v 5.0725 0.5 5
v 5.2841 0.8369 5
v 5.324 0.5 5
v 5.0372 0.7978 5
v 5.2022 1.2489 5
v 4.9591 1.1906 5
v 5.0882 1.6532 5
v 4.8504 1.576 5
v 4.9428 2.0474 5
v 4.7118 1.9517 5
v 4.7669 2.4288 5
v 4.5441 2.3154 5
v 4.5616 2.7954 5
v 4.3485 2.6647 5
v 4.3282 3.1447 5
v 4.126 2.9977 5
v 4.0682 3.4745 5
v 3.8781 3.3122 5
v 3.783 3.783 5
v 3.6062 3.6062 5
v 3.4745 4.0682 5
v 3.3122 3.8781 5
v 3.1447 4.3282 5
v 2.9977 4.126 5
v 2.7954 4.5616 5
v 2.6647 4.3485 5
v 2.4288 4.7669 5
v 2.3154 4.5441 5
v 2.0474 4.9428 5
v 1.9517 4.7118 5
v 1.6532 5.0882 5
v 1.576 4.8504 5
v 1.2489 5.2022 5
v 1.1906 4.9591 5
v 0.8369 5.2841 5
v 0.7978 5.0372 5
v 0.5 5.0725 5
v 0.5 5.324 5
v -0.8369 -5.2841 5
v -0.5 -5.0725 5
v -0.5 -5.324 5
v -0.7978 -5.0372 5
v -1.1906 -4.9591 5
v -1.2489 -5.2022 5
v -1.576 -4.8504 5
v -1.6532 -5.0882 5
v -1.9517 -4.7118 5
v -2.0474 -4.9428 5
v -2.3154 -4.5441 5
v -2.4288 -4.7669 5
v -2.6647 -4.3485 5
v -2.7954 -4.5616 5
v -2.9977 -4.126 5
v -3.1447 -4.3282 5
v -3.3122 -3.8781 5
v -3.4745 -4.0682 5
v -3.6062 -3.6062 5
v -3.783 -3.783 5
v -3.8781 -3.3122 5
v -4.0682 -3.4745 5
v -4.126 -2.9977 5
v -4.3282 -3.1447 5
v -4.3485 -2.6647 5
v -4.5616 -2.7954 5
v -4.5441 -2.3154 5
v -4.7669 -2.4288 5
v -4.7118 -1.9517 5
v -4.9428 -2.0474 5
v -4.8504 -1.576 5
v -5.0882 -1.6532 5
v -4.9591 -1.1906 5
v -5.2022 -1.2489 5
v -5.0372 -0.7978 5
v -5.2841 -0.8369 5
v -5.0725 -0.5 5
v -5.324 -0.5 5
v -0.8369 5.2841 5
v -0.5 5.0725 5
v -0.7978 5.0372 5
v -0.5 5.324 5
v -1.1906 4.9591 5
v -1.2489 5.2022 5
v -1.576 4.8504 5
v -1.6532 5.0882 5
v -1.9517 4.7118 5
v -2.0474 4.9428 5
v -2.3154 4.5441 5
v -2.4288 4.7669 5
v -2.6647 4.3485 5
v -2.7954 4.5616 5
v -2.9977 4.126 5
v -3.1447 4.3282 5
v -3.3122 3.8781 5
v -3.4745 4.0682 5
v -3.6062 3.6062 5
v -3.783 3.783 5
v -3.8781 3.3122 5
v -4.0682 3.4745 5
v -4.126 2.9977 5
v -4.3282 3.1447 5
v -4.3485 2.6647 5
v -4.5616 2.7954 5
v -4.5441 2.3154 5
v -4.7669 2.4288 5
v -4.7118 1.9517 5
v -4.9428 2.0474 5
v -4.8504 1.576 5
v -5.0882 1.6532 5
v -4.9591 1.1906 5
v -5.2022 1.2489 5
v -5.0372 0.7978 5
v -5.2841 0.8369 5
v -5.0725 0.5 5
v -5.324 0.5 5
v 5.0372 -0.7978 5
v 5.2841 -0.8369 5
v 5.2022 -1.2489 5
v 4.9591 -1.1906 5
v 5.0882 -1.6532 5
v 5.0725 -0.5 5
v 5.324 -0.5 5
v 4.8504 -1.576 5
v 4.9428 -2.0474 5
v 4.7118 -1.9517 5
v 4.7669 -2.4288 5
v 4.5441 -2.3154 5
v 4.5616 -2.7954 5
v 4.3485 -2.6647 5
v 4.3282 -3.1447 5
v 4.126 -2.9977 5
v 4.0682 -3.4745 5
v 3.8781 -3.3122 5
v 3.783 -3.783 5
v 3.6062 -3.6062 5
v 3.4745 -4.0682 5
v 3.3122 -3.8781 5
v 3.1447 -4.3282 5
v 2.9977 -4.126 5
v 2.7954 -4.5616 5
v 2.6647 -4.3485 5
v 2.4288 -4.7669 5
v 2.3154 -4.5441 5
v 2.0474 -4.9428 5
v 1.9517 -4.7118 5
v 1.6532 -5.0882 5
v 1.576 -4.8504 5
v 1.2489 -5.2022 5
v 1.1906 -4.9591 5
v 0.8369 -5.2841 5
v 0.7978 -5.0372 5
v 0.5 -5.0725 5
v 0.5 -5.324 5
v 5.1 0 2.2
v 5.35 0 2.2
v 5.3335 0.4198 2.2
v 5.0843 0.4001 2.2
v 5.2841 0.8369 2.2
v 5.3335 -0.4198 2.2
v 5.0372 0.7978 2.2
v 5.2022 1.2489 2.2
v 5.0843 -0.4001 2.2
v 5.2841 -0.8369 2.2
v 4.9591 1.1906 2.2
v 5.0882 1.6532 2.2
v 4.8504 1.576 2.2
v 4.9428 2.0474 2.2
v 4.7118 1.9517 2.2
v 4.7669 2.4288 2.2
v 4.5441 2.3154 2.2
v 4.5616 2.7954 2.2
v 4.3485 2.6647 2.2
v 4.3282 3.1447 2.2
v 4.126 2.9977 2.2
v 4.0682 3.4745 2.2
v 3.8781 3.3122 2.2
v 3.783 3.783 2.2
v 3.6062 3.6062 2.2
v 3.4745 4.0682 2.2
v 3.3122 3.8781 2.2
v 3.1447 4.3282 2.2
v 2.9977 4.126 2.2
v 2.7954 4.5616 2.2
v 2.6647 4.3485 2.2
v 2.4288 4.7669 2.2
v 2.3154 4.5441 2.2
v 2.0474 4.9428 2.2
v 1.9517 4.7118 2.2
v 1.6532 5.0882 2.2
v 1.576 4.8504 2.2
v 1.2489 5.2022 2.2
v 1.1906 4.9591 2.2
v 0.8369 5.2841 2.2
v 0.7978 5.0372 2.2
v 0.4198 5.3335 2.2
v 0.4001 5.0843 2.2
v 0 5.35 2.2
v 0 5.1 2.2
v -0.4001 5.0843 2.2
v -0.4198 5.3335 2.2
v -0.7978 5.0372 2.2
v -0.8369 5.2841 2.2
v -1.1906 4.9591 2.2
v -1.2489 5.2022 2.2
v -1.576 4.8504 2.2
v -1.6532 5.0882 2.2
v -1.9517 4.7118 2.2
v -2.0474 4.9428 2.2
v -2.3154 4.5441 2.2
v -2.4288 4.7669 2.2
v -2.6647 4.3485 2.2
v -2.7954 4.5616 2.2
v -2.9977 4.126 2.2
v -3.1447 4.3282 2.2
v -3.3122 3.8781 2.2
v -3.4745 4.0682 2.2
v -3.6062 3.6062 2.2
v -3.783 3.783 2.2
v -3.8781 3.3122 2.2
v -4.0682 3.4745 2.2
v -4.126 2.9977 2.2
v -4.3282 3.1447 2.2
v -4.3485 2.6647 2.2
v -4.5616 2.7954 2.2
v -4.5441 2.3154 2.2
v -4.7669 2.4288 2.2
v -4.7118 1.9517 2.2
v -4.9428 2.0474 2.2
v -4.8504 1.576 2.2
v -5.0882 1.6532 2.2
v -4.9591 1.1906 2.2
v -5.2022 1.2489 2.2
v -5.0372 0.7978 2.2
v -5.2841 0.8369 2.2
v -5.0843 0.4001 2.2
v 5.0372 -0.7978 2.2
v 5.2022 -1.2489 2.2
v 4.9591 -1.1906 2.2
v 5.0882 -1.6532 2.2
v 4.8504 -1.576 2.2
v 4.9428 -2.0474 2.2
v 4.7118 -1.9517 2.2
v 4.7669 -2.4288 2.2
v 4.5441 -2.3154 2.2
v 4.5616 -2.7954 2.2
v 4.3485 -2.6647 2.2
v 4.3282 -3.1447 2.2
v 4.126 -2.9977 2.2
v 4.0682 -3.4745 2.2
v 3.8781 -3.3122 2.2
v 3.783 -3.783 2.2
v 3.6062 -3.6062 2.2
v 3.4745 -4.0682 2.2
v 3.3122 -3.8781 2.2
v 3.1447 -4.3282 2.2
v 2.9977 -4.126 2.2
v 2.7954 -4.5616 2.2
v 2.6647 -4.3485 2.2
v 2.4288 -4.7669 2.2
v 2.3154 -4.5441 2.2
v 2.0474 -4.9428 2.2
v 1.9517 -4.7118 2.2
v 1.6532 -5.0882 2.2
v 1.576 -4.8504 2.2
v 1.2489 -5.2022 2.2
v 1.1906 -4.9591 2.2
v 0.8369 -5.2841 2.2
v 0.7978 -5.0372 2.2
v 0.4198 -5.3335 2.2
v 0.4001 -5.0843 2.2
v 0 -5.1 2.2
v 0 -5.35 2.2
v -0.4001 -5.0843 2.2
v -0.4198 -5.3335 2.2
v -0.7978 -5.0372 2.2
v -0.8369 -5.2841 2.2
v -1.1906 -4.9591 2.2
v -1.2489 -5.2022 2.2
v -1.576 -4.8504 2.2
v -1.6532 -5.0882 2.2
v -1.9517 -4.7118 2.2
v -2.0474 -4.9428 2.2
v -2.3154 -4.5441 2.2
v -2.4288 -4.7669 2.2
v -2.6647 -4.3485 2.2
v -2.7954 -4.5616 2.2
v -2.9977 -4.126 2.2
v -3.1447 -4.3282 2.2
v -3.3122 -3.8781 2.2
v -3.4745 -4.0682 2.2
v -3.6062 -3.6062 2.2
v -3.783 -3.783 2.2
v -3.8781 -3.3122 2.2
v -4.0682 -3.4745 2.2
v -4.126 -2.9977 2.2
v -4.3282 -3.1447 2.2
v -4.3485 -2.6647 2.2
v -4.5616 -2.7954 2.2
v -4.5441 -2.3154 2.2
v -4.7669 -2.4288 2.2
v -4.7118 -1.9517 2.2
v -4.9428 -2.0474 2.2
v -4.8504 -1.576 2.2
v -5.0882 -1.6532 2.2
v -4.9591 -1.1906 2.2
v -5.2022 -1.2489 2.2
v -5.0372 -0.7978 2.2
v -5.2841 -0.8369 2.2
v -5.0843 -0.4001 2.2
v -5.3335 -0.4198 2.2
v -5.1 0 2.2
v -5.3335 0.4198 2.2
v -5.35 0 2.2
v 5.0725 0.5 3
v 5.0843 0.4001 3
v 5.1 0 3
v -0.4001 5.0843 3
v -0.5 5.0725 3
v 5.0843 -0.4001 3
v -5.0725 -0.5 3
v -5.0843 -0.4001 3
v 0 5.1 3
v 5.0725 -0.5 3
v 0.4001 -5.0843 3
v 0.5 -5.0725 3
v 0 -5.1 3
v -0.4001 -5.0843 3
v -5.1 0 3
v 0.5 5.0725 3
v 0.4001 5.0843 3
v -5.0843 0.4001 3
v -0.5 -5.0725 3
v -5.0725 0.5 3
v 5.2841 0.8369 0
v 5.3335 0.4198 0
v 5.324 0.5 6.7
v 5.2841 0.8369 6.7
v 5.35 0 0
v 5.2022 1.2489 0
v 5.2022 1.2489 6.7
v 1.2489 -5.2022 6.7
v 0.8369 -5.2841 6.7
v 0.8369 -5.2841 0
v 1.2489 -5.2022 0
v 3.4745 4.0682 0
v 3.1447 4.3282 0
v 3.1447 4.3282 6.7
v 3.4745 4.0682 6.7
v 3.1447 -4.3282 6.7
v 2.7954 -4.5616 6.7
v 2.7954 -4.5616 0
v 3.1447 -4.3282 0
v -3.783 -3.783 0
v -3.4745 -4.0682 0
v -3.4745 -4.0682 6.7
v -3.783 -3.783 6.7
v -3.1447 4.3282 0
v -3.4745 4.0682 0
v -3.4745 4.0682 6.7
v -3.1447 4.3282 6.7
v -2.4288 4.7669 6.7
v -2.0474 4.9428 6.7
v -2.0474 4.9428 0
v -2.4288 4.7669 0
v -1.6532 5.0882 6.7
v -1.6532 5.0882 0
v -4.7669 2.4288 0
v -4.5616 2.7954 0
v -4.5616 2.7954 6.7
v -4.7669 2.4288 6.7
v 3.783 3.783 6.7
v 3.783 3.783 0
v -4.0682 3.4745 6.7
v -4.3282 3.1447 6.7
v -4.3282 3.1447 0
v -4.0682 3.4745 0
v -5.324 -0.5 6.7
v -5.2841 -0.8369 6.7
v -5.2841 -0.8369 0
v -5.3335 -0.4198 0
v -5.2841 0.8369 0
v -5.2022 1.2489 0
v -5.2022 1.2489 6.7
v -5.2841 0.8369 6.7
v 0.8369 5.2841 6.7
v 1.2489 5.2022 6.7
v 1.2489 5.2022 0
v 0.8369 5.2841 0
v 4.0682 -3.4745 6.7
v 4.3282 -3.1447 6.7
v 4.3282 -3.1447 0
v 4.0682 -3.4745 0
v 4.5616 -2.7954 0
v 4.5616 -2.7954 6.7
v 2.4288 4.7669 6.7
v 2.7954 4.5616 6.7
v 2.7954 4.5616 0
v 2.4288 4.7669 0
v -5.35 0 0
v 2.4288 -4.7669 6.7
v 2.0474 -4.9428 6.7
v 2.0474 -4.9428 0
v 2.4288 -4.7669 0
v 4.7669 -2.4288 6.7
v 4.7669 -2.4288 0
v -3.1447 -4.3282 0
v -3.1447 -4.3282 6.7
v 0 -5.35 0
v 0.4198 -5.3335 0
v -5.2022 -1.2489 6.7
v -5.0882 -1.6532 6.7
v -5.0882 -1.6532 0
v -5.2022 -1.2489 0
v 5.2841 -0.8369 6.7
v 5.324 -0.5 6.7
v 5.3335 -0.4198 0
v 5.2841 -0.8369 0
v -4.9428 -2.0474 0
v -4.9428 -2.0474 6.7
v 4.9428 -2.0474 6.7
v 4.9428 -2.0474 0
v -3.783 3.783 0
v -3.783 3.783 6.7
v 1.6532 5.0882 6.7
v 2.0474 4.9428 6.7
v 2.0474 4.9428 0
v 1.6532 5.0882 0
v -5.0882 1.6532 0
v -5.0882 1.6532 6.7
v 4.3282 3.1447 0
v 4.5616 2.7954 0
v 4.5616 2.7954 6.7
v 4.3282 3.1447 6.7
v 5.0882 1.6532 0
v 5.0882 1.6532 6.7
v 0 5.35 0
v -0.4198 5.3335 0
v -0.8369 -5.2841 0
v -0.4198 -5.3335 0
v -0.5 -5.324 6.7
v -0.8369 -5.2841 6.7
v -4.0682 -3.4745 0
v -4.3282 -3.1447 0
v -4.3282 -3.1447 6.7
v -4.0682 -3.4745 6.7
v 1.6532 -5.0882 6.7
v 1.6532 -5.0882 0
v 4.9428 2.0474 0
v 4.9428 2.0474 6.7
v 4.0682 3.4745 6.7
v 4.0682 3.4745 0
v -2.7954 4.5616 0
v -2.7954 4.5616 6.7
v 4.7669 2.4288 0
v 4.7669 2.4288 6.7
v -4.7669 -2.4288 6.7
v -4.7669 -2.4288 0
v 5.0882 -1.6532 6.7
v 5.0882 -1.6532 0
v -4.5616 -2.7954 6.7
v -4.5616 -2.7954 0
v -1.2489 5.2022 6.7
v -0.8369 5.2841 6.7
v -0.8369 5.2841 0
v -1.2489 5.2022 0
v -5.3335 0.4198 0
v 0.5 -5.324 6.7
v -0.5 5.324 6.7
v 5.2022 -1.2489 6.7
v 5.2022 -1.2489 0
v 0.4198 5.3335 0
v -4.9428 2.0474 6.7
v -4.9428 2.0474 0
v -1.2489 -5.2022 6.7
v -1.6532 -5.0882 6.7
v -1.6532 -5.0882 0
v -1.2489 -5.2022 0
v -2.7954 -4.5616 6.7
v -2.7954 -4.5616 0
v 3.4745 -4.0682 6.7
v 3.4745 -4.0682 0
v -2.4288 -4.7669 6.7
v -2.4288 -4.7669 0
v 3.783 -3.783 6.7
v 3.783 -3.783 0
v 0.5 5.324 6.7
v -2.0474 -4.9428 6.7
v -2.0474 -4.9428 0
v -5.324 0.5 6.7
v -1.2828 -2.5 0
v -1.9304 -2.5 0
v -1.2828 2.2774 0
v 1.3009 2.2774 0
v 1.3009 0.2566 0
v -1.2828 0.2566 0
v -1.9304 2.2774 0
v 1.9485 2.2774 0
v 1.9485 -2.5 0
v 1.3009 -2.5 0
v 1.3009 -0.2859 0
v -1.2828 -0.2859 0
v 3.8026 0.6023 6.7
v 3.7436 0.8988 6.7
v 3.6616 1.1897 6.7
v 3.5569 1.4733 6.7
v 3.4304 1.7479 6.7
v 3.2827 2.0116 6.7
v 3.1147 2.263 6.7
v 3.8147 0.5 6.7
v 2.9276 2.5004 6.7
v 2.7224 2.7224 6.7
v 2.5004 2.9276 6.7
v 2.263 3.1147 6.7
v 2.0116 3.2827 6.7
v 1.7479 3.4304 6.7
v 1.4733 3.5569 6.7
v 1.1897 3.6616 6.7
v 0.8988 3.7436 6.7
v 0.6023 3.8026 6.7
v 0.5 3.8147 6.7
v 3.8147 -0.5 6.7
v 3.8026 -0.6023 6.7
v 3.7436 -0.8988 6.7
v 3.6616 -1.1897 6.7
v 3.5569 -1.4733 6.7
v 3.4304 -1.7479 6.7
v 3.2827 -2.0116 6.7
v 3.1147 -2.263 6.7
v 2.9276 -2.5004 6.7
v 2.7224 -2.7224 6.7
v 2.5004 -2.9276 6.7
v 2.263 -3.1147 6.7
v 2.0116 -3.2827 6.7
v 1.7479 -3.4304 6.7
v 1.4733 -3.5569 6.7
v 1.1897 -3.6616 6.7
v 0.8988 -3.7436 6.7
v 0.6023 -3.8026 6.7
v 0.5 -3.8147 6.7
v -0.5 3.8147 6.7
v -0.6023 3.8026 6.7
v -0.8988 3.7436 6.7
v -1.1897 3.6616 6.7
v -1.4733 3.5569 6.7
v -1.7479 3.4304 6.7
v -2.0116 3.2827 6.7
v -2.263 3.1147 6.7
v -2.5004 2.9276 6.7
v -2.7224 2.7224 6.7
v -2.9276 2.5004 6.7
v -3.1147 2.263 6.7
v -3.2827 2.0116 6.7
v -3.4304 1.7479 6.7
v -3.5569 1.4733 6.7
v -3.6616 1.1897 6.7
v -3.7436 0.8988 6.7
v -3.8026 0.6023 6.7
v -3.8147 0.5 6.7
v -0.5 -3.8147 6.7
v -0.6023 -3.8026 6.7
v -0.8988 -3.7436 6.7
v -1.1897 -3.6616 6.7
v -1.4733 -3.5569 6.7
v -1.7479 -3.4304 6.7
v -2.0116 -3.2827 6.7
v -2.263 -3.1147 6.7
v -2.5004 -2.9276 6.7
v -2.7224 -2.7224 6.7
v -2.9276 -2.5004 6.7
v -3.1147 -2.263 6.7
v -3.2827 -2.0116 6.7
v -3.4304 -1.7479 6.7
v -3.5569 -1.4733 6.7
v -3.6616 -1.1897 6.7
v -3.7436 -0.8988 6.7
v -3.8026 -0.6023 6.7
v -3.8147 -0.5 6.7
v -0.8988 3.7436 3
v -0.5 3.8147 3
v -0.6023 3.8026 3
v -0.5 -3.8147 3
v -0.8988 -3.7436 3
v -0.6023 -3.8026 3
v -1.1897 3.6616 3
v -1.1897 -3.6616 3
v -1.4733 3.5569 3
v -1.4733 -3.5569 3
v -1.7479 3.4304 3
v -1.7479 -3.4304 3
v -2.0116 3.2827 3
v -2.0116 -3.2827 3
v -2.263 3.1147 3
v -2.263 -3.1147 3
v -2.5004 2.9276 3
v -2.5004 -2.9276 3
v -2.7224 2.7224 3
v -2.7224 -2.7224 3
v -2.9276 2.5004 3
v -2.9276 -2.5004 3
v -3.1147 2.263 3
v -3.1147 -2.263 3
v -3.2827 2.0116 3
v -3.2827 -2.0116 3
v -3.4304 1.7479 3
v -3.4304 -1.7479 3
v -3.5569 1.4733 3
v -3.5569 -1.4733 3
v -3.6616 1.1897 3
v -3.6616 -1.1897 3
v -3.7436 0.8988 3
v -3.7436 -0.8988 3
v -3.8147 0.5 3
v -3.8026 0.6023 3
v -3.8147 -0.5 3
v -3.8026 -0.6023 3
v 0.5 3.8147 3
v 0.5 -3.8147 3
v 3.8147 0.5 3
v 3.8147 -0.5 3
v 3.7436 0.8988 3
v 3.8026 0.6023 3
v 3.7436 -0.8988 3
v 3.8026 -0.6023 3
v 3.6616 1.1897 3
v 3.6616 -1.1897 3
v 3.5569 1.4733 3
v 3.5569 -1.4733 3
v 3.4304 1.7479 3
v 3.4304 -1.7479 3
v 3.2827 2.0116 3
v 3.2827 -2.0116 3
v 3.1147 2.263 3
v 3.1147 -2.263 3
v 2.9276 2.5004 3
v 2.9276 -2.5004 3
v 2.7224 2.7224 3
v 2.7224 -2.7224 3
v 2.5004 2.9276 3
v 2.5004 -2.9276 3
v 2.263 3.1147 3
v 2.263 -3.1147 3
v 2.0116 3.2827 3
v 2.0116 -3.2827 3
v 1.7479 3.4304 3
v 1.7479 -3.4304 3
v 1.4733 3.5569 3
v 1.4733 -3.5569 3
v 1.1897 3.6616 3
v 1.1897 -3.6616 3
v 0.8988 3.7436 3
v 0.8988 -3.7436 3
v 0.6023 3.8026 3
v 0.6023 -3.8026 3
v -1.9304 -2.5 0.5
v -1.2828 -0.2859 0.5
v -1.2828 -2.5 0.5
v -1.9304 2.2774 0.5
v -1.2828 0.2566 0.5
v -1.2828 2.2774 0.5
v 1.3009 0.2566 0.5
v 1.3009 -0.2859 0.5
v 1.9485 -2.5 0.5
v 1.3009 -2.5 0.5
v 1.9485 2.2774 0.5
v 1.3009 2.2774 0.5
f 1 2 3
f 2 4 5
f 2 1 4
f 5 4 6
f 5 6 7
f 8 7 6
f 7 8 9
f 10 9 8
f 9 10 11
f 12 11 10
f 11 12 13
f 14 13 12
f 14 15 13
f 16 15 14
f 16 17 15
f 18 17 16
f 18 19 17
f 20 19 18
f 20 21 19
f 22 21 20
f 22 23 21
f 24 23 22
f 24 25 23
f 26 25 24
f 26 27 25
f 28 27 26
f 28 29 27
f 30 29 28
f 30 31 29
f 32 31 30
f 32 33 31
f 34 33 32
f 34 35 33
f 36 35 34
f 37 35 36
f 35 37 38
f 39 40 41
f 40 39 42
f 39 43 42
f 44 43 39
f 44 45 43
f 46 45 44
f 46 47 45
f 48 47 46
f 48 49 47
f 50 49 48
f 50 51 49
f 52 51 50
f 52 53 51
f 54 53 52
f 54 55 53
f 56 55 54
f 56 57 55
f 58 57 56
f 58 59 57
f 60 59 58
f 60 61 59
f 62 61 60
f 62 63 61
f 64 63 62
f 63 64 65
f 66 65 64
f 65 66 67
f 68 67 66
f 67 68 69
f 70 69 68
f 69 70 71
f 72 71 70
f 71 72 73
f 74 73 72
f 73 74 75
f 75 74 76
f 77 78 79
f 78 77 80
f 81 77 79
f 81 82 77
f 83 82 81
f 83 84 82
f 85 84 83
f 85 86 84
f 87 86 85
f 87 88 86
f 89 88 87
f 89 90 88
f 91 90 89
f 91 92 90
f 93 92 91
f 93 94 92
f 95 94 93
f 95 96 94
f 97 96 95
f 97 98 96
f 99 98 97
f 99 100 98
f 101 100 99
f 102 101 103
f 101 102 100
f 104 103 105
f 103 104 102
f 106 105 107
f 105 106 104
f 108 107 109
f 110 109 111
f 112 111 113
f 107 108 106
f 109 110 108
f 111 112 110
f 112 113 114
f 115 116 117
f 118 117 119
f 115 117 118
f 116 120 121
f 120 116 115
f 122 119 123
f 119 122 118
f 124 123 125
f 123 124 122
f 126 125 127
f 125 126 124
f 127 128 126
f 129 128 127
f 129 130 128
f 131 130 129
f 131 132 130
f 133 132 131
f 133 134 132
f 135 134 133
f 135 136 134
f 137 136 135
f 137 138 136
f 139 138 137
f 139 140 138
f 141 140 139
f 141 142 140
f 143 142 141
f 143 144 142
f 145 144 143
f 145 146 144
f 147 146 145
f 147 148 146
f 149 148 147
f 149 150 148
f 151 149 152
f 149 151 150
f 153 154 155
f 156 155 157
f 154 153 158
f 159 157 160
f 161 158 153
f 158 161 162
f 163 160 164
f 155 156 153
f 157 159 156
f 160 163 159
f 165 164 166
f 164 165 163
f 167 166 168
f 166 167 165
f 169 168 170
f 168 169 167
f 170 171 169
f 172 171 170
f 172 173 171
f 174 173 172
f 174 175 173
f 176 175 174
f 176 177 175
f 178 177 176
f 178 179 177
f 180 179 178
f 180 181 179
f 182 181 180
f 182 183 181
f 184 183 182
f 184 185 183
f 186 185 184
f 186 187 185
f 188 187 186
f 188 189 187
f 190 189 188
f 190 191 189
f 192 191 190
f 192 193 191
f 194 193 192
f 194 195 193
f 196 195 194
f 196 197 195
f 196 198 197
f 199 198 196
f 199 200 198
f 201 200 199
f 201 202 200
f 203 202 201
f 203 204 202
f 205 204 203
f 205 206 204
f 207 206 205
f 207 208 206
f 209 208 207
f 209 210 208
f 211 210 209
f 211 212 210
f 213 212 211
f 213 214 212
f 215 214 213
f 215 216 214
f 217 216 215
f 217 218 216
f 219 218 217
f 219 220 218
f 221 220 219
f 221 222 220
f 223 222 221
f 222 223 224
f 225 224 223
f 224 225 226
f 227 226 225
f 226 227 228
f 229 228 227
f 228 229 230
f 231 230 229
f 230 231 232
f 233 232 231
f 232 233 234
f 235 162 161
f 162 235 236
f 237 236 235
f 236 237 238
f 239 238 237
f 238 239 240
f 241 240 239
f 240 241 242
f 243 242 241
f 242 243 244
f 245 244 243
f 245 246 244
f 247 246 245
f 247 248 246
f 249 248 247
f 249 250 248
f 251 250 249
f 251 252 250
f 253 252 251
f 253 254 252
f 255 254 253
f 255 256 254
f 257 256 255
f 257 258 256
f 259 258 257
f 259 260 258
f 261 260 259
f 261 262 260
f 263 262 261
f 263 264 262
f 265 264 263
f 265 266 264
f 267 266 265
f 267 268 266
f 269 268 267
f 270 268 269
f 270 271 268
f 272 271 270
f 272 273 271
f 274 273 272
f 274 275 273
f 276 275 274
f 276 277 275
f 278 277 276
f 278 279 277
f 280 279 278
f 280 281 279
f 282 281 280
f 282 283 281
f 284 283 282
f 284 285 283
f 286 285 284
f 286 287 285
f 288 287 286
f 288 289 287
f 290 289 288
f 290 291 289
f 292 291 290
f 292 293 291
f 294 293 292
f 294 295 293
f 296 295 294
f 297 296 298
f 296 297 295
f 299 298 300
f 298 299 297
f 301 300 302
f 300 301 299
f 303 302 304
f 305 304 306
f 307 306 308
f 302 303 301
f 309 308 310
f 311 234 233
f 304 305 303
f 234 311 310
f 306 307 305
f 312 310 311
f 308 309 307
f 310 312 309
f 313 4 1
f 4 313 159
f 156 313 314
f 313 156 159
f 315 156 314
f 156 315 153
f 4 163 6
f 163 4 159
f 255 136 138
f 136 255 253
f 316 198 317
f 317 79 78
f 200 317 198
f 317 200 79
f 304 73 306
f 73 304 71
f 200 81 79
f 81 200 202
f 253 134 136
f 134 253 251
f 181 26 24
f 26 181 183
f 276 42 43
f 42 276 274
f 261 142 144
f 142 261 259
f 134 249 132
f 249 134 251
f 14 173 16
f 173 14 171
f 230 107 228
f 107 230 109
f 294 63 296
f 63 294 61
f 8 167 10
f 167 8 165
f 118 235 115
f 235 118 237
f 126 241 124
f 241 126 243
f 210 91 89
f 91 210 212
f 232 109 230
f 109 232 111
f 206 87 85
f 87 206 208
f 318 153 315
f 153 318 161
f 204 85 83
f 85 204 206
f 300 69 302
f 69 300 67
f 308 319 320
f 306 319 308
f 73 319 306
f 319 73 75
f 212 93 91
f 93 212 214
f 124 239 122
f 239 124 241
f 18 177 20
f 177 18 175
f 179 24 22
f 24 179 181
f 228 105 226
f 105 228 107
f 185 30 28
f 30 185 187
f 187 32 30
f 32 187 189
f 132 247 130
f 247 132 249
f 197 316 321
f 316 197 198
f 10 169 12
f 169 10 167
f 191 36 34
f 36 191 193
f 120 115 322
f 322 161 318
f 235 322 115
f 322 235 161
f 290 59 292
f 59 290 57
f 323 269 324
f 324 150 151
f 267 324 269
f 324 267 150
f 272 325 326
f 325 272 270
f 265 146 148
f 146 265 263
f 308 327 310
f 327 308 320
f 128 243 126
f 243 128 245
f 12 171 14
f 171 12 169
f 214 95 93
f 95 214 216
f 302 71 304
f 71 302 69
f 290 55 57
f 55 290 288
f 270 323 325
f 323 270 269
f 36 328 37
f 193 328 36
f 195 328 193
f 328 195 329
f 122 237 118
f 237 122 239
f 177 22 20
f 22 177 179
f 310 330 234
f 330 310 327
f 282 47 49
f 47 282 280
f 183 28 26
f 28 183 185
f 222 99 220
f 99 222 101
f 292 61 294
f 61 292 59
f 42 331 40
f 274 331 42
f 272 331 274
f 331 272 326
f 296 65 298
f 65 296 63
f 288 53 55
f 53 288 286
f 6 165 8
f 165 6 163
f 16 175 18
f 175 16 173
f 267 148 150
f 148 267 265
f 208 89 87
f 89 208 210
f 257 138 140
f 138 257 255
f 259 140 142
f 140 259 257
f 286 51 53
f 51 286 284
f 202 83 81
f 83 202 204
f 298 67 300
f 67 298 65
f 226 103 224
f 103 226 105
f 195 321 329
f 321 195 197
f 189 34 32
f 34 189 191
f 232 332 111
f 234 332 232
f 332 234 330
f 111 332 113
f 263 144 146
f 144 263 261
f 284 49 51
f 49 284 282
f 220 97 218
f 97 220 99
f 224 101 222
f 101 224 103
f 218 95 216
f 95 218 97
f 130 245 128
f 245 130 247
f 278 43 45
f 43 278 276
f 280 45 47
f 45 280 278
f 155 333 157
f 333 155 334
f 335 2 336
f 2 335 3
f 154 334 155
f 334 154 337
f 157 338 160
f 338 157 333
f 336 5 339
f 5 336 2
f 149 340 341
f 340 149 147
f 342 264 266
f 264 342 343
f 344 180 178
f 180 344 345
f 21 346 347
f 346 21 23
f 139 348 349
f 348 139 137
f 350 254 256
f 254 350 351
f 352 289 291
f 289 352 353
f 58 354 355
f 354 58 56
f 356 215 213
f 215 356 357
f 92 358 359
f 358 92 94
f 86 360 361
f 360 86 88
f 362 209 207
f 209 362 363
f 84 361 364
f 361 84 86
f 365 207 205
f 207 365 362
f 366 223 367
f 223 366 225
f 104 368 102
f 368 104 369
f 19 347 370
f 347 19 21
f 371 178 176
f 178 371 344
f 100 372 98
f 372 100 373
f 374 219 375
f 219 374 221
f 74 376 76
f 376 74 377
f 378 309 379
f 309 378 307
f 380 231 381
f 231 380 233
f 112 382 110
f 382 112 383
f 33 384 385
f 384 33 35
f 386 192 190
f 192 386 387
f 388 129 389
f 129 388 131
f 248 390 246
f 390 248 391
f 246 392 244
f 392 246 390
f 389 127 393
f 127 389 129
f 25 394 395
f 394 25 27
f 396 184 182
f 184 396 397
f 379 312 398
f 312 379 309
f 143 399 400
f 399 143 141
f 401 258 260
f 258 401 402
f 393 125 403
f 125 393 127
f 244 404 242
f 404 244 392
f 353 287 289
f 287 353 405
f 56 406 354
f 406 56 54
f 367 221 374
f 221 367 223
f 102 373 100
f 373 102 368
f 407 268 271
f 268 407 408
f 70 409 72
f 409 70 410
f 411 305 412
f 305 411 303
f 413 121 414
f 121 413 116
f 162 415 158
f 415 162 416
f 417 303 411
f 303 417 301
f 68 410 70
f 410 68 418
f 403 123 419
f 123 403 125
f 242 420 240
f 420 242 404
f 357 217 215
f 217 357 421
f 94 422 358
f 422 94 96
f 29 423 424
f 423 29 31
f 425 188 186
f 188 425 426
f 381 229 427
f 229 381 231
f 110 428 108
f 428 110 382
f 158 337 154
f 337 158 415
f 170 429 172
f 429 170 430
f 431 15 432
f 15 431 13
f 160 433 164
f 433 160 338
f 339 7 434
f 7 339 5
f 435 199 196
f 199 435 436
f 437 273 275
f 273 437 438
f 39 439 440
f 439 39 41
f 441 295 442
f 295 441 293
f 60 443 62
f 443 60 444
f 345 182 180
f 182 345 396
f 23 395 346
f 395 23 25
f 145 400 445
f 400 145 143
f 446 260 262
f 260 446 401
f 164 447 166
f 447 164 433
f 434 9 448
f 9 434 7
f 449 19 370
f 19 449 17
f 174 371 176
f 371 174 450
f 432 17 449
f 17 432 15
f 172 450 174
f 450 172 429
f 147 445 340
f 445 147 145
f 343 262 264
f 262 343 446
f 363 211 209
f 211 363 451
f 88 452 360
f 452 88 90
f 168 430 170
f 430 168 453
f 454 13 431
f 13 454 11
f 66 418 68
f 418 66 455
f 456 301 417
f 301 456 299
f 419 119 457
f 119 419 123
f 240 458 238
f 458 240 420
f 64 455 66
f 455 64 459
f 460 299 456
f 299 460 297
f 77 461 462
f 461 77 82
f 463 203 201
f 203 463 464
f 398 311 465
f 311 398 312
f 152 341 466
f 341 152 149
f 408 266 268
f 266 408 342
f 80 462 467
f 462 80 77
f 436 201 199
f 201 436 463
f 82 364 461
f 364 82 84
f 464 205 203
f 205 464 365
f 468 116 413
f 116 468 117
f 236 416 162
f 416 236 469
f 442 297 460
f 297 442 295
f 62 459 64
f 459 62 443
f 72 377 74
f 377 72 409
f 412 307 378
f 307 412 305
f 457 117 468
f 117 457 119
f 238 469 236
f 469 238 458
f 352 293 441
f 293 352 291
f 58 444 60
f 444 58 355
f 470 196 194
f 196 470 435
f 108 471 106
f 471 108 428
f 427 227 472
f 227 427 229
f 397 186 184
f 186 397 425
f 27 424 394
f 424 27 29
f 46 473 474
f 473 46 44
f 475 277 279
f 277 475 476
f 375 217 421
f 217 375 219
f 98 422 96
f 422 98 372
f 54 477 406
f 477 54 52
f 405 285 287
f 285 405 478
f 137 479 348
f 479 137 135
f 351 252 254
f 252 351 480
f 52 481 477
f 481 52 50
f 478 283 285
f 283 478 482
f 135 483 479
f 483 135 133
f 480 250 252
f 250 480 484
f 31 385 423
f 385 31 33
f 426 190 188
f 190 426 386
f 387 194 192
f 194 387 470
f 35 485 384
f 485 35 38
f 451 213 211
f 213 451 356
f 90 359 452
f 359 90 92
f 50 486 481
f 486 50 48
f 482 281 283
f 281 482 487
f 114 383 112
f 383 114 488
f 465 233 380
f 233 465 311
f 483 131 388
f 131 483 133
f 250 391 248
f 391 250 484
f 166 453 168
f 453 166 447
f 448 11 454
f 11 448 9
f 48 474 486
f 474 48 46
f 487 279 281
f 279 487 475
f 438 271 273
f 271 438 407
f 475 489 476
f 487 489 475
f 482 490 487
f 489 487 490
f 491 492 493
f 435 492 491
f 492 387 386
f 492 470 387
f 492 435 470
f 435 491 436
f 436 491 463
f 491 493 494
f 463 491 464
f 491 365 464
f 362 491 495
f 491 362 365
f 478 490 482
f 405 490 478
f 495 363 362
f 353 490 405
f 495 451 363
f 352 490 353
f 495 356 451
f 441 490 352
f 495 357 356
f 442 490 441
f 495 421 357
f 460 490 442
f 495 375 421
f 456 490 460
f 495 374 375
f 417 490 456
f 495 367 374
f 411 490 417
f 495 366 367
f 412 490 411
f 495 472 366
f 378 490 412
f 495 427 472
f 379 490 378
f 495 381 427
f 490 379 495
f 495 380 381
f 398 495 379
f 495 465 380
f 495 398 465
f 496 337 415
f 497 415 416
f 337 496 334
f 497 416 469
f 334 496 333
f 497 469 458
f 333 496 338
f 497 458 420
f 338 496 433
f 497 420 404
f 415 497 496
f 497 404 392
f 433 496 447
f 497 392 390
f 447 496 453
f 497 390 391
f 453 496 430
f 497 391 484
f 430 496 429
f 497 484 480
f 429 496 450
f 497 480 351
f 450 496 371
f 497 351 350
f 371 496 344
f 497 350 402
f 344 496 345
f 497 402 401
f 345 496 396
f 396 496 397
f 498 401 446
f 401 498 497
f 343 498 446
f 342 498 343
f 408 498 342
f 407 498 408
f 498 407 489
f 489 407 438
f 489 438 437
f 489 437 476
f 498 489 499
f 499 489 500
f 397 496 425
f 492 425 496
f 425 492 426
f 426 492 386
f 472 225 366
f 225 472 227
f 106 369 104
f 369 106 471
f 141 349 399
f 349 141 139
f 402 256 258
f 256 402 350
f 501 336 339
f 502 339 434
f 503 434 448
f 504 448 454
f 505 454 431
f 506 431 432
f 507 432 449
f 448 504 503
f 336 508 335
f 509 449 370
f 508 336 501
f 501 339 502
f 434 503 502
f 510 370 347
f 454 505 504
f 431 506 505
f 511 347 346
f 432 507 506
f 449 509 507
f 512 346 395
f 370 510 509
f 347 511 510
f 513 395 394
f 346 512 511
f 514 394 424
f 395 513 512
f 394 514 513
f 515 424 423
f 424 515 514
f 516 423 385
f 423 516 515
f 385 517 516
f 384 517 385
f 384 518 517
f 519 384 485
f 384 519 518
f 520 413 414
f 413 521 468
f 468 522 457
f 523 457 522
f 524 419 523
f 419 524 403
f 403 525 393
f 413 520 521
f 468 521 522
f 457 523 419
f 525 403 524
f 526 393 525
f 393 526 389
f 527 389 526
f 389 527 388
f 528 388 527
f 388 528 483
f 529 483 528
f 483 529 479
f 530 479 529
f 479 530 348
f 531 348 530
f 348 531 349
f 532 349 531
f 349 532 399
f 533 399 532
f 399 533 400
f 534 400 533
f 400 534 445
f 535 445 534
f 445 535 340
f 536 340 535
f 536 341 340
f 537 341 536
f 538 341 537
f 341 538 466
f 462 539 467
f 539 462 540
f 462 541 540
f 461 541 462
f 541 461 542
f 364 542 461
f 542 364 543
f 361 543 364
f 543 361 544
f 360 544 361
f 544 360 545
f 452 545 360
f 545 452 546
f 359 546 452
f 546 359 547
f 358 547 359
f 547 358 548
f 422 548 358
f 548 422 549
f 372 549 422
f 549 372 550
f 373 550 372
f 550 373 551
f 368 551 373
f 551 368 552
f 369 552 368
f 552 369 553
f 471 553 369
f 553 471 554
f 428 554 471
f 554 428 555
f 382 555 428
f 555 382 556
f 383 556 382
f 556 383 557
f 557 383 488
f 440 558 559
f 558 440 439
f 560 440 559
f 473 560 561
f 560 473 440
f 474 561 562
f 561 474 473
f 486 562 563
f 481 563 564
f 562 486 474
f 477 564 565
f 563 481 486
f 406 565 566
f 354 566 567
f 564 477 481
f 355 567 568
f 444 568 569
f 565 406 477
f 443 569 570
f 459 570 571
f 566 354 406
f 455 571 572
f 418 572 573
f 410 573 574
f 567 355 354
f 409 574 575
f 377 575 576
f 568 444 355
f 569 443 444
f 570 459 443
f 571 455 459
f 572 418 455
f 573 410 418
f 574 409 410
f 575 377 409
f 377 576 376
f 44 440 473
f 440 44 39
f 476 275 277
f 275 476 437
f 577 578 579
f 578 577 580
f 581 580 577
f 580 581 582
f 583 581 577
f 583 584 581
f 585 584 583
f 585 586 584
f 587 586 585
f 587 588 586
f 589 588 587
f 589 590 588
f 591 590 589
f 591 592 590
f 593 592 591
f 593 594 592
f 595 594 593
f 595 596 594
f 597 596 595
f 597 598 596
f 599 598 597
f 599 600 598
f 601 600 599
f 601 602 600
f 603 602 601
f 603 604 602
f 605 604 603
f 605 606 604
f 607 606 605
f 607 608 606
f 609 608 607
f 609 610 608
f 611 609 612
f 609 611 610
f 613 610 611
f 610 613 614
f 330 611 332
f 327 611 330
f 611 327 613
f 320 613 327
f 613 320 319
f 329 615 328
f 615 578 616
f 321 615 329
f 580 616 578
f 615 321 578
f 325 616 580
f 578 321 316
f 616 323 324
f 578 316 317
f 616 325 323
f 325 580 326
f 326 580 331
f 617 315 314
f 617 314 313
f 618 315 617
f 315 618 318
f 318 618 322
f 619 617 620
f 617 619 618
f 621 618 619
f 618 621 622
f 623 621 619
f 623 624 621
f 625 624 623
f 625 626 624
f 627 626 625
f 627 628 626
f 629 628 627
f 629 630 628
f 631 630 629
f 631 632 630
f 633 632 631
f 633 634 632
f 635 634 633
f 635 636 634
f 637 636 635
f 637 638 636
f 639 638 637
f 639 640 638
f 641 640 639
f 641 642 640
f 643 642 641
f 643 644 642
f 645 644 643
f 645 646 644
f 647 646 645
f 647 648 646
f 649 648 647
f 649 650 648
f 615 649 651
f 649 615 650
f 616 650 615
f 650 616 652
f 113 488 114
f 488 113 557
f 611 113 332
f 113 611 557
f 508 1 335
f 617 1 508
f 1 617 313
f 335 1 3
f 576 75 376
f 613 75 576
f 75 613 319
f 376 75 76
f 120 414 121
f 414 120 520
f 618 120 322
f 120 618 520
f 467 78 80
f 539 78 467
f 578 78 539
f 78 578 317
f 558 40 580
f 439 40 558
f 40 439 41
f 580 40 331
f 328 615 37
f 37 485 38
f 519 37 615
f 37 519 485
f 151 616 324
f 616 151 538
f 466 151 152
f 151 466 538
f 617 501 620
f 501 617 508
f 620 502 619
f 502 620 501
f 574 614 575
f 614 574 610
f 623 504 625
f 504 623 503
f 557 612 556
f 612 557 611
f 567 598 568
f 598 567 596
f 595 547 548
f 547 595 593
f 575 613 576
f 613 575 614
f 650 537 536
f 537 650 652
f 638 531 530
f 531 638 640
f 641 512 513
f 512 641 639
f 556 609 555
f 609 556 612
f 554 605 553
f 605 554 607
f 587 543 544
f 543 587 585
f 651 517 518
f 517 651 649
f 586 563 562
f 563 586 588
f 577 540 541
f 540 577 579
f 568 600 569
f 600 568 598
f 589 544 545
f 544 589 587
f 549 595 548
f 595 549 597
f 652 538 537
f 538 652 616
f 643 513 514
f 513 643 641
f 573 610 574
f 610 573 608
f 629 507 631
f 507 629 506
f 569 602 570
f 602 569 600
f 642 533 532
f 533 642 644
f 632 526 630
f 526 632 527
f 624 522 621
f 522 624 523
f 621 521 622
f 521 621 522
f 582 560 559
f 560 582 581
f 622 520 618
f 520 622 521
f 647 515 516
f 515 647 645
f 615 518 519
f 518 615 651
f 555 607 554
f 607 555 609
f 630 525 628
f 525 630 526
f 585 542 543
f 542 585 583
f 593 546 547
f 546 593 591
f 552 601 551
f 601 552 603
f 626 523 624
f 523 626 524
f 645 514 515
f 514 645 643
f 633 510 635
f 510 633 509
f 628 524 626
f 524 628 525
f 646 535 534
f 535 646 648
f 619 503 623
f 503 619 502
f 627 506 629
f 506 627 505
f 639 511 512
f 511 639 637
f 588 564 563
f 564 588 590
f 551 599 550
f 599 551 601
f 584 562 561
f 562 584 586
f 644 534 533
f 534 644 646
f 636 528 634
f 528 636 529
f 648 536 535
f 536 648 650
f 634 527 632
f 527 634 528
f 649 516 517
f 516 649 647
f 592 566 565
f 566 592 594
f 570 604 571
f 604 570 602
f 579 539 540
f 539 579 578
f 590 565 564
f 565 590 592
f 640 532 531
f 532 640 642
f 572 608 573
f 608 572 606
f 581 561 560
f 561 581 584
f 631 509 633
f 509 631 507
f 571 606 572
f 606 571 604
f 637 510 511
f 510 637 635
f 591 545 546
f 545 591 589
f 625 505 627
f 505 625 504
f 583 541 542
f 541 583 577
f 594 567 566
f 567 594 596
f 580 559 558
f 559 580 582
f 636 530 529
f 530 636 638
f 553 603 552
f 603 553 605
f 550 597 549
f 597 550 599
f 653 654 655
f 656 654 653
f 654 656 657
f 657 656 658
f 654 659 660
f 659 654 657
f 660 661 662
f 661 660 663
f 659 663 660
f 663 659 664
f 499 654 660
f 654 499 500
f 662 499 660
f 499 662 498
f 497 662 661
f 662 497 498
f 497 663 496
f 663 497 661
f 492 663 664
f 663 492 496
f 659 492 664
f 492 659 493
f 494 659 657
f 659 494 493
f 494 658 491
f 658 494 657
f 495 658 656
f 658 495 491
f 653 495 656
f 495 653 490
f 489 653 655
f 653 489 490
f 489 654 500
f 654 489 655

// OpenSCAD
// just a quick water tap screw cap cover

topdia=10.7;
topHight=6.7;
$fn=80;
tex="H";// text on top
 
difference(){
 cylinder(d=topdia,h=topHight);
   difference(){//cut out around center
     translate([0,0,topHight-4.5])cylinder(d=topdia+0.1,h=2.8);
     translate([0,0,topHight-4.5])cylinder(d=topdia-0.5,h=2.8);
   }
   // slot cutouts
   translate([-topdia/2,-0.5,3])cube([topdia,1,4.5]);
   rotate([0,0,90])translate([-topdia/2,-0.5,3])cube([topdia,1,4.5]);
   // inside cutout
   translate([0,0,3])cylinder(d=topdia-3,h=topHight-2);
   // text on top
   translate([-2.5,-2.5,-0.5])
   linear_extrude(height = 1, center = false, convexity = 10, twist = 0)
   text(tex,5);
  
}
